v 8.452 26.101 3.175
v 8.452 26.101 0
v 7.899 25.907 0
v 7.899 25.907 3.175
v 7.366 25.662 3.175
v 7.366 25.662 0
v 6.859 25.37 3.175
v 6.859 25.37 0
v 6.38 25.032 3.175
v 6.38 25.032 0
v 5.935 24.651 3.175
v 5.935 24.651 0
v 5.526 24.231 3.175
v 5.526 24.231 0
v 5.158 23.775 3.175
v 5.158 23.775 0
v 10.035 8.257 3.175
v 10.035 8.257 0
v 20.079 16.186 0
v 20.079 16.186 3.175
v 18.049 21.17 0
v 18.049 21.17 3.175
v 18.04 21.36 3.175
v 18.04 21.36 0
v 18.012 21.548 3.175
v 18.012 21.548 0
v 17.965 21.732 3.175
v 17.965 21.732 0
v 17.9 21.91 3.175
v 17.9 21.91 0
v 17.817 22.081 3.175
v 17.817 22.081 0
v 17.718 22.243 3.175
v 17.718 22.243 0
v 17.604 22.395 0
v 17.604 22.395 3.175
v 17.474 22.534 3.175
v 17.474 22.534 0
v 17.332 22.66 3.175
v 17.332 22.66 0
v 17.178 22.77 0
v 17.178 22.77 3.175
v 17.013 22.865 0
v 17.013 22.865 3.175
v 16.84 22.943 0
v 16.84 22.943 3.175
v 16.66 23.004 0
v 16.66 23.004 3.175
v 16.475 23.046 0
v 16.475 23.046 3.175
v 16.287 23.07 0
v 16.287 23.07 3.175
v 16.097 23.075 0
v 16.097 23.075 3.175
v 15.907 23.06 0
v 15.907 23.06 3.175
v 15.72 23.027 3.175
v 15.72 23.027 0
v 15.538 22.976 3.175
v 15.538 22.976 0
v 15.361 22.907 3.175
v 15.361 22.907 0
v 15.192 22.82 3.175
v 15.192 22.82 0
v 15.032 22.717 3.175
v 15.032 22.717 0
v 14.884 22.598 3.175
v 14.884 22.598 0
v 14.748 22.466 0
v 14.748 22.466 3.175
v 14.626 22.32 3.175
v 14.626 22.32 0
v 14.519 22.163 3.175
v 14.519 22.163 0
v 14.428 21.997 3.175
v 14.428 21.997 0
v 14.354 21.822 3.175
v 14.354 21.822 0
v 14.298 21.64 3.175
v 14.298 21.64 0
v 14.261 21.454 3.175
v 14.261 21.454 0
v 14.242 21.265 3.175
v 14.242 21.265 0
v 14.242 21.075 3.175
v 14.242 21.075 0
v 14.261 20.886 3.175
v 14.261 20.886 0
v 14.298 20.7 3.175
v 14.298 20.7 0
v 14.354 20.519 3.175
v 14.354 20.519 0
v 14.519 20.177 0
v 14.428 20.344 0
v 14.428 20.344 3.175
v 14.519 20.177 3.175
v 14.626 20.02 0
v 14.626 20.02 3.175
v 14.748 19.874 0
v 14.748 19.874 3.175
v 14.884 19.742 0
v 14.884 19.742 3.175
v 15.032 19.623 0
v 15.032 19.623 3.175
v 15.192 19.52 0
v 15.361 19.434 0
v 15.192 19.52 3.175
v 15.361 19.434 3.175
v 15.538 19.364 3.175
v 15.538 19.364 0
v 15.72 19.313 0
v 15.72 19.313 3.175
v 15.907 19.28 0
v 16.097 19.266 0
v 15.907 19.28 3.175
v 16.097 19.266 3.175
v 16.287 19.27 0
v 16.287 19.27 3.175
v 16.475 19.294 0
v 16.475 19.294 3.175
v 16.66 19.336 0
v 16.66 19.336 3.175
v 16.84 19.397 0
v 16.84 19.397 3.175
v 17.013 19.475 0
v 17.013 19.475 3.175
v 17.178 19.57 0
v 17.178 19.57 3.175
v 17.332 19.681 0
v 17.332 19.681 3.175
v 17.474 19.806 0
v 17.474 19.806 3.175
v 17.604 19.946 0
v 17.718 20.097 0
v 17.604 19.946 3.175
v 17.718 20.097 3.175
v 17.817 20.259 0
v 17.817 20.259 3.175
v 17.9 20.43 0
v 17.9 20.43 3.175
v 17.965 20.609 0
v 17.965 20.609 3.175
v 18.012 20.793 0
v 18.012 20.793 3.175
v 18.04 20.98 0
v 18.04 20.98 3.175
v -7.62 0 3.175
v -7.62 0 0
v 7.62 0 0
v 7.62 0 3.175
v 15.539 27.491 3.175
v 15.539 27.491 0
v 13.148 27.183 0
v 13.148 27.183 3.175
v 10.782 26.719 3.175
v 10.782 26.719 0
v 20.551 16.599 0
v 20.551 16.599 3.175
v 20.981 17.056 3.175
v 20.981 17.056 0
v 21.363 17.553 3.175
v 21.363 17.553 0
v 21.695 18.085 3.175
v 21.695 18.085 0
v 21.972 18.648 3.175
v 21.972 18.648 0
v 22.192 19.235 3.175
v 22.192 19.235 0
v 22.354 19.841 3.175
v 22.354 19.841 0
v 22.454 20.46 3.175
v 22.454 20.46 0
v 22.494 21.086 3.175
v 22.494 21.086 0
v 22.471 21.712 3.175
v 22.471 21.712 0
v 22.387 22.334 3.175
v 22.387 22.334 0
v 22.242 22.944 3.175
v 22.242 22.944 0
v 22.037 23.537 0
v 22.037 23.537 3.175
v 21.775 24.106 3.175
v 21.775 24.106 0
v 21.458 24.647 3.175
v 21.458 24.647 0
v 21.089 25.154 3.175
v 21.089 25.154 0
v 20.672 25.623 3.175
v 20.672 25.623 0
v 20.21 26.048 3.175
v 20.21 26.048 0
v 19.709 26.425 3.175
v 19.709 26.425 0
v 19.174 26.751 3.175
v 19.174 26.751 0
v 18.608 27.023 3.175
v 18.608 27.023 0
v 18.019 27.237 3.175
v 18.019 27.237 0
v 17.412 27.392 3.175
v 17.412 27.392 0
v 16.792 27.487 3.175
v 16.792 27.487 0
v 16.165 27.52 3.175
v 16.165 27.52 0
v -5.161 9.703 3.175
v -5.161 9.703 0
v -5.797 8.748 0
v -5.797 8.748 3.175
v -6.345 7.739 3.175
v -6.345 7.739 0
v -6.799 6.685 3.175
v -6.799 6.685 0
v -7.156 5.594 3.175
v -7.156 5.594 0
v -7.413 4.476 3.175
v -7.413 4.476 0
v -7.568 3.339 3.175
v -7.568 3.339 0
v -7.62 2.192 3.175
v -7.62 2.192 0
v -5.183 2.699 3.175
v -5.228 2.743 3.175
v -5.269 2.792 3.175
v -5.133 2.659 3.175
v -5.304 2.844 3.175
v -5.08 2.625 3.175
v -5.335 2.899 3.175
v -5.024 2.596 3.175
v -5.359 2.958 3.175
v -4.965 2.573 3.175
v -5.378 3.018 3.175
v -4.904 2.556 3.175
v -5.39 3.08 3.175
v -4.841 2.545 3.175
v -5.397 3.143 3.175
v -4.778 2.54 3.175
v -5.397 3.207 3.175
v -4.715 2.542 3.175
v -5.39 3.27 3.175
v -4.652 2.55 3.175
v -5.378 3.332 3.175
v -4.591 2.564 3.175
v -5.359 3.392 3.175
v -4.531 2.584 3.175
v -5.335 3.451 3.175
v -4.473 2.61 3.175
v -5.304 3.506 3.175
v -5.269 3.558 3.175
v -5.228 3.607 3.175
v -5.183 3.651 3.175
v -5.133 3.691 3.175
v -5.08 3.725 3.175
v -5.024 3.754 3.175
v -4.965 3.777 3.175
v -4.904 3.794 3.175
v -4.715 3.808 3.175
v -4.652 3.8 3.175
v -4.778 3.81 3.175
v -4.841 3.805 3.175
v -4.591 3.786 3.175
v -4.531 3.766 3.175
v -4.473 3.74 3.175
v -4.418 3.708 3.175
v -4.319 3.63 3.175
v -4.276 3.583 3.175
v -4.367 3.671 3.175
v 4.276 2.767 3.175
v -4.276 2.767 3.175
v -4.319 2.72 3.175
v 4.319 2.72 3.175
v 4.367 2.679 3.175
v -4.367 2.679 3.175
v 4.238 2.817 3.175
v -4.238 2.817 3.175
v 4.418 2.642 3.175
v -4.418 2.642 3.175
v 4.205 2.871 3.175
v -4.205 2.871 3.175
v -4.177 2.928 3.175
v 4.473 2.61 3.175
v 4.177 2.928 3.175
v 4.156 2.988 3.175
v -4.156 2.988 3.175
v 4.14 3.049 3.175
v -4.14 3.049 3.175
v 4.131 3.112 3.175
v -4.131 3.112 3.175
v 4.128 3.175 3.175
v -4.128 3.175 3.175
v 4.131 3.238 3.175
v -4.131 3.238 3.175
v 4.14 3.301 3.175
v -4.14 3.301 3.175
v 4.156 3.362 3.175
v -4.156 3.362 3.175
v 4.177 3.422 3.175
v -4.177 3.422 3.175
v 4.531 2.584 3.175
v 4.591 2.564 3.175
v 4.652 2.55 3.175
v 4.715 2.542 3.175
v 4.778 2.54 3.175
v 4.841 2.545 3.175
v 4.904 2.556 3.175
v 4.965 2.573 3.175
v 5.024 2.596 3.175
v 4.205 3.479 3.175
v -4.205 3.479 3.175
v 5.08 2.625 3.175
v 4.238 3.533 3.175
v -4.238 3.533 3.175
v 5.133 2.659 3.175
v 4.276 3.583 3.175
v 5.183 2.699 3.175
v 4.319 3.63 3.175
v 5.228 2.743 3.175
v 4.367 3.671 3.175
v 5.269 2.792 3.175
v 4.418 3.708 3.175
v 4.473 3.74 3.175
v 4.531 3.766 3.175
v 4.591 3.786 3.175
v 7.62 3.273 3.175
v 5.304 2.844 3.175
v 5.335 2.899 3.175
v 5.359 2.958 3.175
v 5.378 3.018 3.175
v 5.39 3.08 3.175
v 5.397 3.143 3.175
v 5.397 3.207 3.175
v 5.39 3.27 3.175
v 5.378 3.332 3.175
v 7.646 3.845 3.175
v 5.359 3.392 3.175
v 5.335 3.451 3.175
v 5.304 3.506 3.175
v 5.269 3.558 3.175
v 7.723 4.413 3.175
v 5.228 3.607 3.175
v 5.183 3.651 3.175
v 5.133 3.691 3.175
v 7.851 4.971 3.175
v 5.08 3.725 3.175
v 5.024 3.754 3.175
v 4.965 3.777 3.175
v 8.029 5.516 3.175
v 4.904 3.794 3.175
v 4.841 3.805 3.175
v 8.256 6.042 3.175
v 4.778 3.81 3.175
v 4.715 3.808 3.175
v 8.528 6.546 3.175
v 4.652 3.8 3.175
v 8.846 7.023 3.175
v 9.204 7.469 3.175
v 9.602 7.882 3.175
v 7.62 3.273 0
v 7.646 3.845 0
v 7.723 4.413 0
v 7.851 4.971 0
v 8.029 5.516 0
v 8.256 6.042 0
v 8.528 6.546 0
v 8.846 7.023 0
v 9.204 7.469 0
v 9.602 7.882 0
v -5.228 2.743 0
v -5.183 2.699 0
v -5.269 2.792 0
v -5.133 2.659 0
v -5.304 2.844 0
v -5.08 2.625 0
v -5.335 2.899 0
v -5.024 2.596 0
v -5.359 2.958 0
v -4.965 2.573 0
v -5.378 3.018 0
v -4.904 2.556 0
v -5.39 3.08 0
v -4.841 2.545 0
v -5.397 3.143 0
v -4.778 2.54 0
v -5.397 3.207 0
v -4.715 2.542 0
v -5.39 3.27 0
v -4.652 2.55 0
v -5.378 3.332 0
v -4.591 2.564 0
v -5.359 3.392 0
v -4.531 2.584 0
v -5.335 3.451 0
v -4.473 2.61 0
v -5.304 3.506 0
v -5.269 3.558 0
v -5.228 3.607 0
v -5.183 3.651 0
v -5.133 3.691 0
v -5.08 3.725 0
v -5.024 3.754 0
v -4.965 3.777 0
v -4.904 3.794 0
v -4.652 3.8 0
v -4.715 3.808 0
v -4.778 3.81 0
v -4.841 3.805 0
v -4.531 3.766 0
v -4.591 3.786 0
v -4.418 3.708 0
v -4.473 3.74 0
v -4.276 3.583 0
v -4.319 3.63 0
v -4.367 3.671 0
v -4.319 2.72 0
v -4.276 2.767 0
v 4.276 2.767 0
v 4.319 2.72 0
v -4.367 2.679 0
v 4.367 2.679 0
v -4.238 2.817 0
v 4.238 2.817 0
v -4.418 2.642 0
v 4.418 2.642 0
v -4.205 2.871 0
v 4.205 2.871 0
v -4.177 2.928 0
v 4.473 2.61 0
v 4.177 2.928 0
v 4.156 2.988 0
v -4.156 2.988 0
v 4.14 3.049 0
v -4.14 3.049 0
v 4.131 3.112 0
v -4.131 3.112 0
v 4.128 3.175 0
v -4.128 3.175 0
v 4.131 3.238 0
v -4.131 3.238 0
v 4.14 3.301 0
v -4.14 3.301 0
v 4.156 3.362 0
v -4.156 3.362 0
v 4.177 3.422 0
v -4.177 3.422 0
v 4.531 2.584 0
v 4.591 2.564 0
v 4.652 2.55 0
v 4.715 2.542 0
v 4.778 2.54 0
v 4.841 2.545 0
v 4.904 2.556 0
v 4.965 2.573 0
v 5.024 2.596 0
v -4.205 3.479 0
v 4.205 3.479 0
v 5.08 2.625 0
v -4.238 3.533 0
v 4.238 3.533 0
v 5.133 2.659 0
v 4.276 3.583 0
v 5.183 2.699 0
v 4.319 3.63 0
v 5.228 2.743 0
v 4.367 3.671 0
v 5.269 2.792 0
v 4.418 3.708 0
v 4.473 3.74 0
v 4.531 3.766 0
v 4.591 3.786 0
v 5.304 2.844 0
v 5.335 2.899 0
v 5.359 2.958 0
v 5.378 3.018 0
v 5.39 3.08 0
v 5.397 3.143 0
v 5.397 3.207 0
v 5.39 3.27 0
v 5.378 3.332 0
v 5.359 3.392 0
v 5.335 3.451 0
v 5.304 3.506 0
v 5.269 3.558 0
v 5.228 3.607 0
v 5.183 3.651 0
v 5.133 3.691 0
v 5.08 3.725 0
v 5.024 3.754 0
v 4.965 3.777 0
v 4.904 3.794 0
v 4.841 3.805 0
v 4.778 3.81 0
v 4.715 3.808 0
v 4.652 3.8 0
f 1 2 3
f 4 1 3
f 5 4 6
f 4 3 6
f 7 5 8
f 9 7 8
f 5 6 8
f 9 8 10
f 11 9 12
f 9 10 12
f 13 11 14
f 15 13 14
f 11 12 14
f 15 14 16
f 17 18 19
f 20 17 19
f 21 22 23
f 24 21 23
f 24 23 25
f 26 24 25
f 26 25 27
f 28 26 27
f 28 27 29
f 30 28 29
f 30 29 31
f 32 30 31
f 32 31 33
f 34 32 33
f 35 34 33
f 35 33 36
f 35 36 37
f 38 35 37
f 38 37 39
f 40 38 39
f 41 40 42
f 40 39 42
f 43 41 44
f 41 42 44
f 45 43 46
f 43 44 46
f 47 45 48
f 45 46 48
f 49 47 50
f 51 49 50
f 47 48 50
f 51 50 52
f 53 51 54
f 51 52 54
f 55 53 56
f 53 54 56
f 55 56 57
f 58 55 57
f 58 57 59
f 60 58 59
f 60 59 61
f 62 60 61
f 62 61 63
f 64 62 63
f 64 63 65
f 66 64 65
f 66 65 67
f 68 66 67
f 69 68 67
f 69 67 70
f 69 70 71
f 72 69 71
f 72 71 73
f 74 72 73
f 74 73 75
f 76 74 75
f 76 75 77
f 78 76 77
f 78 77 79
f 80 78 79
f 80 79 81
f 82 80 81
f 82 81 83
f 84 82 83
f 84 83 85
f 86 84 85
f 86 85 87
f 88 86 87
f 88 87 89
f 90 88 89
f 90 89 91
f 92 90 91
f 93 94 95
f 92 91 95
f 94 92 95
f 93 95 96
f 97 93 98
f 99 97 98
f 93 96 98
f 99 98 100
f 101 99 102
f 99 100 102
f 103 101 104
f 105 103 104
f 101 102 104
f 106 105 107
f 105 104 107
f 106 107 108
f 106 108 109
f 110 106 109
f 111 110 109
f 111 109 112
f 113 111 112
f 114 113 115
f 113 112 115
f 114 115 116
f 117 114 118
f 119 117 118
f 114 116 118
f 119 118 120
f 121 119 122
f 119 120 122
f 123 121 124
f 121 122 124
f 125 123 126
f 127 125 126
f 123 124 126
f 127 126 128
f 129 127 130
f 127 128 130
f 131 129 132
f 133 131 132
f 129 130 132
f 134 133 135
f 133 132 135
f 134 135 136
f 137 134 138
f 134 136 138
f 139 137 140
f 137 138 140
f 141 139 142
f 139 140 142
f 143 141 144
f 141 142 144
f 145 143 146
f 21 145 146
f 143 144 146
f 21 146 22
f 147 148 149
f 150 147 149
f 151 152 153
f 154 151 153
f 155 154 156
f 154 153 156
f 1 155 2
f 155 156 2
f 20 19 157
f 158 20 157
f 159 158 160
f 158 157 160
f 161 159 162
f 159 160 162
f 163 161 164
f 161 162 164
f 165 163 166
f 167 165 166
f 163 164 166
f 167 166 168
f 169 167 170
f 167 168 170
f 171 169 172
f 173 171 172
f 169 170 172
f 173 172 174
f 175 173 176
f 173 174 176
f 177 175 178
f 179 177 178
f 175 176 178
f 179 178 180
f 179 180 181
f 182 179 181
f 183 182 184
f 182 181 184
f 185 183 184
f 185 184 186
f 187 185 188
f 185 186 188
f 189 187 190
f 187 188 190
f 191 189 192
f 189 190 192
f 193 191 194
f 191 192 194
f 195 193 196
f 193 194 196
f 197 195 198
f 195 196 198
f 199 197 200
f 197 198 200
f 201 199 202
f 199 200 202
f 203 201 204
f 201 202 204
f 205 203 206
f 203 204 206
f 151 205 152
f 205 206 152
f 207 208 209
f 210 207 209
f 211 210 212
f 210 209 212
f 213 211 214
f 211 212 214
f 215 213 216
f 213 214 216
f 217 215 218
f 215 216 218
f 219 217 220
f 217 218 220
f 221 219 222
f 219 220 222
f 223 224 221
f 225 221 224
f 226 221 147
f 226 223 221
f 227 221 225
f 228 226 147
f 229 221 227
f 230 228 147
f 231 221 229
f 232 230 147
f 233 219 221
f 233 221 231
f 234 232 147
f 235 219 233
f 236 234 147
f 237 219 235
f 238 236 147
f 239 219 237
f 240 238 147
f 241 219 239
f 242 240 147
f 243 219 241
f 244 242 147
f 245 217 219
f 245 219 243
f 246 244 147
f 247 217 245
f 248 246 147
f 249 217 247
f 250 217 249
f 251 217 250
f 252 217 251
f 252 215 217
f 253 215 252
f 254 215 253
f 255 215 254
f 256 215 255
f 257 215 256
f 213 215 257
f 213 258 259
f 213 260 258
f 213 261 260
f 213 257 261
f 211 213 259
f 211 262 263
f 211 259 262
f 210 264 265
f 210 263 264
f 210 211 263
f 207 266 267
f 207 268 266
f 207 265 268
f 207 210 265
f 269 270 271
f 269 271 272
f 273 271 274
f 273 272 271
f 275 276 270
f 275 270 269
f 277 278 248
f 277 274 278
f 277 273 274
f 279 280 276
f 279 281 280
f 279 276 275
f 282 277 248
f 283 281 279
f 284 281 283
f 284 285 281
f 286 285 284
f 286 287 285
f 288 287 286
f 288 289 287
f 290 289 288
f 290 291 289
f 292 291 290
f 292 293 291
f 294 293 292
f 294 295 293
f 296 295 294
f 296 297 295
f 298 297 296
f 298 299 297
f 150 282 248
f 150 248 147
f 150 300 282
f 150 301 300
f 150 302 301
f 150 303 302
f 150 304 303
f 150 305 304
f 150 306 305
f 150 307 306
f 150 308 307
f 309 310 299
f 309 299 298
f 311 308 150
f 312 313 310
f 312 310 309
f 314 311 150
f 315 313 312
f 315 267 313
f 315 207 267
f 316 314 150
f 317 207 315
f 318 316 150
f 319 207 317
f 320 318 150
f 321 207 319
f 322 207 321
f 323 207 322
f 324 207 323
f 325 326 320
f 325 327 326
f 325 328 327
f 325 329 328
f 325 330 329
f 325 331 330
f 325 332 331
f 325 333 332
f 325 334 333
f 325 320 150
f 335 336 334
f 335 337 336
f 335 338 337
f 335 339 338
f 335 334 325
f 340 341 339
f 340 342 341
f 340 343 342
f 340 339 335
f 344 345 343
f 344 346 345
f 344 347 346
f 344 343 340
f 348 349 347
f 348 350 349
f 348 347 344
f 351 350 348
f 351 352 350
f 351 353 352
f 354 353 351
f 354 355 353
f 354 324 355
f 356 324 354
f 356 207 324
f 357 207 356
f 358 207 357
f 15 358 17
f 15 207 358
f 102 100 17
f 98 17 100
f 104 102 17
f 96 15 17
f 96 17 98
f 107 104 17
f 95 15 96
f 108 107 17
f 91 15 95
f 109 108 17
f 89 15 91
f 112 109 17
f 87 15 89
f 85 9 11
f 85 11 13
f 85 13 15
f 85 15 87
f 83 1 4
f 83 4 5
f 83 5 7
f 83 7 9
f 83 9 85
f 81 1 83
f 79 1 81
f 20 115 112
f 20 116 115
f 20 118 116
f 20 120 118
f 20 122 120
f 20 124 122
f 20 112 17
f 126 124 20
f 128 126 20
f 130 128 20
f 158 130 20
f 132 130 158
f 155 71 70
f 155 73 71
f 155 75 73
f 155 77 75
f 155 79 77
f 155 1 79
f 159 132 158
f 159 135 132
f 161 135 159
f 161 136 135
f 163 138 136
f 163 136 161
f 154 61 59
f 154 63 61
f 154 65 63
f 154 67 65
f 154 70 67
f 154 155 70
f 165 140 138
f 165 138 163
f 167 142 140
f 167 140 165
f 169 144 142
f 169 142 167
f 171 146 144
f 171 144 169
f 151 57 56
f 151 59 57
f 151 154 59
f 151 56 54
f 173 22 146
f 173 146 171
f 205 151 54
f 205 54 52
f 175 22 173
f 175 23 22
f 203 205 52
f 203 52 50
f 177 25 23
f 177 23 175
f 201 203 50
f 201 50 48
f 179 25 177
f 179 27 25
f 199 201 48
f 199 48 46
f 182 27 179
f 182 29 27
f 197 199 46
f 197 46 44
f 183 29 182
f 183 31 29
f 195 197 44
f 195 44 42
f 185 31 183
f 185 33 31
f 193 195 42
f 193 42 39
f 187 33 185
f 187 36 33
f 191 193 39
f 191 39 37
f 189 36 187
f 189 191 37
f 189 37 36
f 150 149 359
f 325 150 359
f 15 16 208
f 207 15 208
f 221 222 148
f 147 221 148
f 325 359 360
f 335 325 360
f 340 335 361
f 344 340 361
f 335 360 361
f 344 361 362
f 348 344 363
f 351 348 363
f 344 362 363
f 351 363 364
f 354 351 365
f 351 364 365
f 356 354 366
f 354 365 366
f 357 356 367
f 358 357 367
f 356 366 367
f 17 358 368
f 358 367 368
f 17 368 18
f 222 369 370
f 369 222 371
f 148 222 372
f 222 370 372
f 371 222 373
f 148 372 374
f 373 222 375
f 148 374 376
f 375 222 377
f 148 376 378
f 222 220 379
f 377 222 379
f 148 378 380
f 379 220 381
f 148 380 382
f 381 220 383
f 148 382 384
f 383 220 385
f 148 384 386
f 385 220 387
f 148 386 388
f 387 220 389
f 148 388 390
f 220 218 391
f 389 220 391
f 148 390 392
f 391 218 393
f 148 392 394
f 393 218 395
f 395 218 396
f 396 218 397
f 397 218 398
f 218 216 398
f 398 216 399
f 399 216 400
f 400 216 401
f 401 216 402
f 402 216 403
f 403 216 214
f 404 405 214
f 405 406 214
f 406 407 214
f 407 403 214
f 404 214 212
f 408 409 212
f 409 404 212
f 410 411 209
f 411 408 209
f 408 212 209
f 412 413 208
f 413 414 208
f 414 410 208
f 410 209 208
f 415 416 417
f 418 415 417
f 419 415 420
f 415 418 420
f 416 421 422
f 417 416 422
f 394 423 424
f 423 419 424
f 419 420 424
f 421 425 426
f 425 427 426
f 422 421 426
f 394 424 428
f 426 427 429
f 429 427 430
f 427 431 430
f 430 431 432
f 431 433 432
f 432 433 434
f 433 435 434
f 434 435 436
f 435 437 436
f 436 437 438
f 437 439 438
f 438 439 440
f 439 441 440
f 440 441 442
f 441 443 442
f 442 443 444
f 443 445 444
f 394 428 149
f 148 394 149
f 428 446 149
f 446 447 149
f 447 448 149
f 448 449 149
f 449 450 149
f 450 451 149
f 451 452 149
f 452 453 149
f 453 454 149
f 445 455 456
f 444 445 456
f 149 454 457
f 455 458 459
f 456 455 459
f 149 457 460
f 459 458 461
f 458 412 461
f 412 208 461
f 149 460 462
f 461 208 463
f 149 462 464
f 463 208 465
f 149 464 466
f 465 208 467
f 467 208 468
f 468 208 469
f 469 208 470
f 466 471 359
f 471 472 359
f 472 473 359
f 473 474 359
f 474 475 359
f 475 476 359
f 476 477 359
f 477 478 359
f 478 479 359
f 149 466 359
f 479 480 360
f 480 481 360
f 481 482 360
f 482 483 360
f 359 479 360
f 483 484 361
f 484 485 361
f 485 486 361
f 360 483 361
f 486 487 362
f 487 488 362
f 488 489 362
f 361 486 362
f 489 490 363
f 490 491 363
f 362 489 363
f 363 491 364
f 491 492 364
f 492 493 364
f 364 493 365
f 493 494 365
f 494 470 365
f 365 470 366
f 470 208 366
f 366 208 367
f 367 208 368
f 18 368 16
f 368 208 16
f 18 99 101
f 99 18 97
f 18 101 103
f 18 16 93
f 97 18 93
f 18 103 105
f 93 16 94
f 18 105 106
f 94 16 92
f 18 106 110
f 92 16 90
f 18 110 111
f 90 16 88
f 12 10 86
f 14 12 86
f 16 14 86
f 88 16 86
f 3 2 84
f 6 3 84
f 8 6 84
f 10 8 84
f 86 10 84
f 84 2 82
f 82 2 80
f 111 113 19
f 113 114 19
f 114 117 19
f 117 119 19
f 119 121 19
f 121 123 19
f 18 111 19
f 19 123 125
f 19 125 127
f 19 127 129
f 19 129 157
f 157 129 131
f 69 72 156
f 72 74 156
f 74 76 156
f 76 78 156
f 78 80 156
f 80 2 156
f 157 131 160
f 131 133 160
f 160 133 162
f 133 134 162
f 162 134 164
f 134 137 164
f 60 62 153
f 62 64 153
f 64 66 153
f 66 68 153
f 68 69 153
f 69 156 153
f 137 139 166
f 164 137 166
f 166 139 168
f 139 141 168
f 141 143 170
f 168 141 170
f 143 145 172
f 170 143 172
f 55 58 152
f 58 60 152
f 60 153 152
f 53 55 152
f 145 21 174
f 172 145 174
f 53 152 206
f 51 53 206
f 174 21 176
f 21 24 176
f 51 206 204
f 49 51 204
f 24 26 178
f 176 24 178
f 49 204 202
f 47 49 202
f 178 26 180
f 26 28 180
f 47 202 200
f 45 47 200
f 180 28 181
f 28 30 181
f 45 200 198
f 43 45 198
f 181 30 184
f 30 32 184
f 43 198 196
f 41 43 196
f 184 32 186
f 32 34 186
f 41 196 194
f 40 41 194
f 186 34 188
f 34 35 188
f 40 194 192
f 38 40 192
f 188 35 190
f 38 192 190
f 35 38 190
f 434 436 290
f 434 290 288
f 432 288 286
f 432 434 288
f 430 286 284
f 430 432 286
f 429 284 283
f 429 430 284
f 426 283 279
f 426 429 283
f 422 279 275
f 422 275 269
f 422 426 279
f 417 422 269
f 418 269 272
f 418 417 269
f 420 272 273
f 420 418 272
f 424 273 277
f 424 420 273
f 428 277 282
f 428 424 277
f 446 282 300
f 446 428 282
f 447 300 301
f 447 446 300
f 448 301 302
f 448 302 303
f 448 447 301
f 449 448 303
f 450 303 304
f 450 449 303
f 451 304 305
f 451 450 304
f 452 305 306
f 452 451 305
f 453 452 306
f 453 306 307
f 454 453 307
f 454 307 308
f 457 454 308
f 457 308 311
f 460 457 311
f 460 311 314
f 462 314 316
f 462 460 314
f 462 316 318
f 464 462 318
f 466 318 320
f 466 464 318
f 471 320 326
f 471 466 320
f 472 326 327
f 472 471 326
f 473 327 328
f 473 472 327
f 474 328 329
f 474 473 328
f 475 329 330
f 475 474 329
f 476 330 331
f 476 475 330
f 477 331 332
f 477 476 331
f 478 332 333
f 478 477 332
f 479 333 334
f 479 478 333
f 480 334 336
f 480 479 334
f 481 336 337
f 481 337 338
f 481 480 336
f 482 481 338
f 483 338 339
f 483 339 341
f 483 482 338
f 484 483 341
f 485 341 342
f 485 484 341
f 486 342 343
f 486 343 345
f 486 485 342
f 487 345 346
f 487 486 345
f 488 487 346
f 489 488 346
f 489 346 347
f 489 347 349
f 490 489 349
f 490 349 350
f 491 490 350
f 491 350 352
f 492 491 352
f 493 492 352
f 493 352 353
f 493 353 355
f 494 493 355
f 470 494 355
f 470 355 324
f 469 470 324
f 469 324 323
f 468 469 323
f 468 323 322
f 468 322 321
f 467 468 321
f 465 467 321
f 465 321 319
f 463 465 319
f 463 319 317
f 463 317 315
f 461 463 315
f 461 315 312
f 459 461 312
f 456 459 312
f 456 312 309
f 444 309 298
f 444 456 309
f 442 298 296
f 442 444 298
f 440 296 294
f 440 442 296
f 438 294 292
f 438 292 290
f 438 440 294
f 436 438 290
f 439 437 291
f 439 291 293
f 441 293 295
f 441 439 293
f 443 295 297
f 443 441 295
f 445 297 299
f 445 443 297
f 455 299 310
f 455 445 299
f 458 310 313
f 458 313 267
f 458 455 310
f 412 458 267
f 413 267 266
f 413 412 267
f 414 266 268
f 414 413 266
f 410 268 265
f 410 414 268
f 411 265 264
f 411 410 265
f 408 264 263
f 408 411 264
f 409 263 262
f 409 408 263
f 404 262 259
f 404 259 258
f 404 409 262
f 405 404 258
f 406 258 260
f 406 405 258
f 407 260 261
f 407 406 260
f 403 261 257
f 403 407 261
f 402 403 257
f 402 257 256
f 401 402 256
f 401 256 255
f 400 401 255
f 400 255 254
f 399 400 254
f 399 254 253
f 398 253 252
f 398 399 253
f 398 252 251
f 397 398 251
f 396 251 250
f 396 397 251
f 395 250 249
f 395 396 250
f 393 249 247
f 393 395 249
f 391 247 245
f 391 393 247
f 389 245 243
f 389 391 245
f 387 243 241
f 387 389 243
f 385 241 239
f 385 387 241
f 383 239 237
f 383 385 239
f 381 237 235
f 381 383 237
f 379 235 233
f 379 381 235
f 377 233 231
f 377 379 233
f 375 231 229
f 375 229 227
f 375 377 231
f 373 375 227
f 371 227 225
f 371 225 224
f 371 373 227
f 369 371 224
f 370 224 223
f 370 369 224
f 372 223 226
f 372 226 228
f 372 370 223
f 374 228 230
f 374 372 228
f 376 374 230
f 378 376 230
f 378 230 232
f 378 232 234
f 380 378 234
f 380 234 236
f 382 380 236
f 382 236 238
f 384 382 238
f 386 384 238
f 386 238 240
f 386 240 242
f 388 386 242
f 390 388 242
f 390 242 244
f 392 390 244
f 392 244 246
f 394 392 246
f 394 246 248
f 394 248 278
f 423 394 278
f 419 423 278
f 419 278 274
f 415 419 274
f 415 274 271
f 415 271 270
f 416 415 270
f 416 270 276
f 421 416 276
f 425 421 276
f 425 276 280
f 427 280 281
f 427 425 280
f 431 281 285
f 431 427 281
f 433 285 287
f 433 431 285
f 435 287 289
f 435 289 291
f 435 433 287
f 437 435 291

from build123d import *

# Parameters (mm, degrees)
SKETCH1_R      = 0.635
EXTRUDE1_DEPTH = 3.175
SKETCH2_R      = 1.905
EXTRUDE2_DEPTH = 4.175


with BuildPart() as part:
    # Sketch1 → Extrude1 (new body)
    with BuildSketch(Plane.XY):
        with BuildLine():
            Line((-7.62, 0), (7.62, 0))
            Line((7.62, 0), (7.62, 3.272777676))
            ThreePointArc((7.62, 3.272777676), (8.25562747, 6.041973695), (10.035258768, 8.256783238))
            Line((10.035258768, 8.256783238), (20.079071056, 16.186108729))
            ThreePointArc((20.079071056, 16.186108729), (22.036906124, 23.536555615), (15.53898187, 27.491194408))
            ThreePointArc((15.53898187, 27.491194408), (11.961099032, 26.970268702), (8.451534603, 26.101035293))
            ThreePointArc((8.451534603, 26.101035293), (6.615319821, 25.206255275), (5.1581845, 23.774797045))
            Line((5.1581845, 23.774797045), (-5.161343447, 9.702713481))
            ThreePointArc((-5.161343447, 9.702713481), (-6.989694731, 6.143656664), (-7.62, 2.192394953))
            Line((-7.62, 2.192394953), (-7.62, 0))
        make_face()
        with Locations((-4.7625, 3.175)):
            Circle(SKETCH1_R, mode=Mode.SUBTRACT)
        with Locations(Location((4.7625, 3.175, 0), (0, 0, 180))):  # turned: the seam where the file's is
            Circle(SKETCH1_R, mode=Mode.SUBTRACT)
    extrude(amount=EXTRUDE1_DEPTH)

    # Sketch2 → Extrude2 (cut, through all)
    with BuildSketch(Plane.XY.offset(3.175)):
        with Locations((16.144329824, 21.17011429)):
            Circle(SKETCH2_R)
    extrude(amount=-EXTRUDE2_DEPTH, mode=Mode.SUBTRACT)


solid = part.part
